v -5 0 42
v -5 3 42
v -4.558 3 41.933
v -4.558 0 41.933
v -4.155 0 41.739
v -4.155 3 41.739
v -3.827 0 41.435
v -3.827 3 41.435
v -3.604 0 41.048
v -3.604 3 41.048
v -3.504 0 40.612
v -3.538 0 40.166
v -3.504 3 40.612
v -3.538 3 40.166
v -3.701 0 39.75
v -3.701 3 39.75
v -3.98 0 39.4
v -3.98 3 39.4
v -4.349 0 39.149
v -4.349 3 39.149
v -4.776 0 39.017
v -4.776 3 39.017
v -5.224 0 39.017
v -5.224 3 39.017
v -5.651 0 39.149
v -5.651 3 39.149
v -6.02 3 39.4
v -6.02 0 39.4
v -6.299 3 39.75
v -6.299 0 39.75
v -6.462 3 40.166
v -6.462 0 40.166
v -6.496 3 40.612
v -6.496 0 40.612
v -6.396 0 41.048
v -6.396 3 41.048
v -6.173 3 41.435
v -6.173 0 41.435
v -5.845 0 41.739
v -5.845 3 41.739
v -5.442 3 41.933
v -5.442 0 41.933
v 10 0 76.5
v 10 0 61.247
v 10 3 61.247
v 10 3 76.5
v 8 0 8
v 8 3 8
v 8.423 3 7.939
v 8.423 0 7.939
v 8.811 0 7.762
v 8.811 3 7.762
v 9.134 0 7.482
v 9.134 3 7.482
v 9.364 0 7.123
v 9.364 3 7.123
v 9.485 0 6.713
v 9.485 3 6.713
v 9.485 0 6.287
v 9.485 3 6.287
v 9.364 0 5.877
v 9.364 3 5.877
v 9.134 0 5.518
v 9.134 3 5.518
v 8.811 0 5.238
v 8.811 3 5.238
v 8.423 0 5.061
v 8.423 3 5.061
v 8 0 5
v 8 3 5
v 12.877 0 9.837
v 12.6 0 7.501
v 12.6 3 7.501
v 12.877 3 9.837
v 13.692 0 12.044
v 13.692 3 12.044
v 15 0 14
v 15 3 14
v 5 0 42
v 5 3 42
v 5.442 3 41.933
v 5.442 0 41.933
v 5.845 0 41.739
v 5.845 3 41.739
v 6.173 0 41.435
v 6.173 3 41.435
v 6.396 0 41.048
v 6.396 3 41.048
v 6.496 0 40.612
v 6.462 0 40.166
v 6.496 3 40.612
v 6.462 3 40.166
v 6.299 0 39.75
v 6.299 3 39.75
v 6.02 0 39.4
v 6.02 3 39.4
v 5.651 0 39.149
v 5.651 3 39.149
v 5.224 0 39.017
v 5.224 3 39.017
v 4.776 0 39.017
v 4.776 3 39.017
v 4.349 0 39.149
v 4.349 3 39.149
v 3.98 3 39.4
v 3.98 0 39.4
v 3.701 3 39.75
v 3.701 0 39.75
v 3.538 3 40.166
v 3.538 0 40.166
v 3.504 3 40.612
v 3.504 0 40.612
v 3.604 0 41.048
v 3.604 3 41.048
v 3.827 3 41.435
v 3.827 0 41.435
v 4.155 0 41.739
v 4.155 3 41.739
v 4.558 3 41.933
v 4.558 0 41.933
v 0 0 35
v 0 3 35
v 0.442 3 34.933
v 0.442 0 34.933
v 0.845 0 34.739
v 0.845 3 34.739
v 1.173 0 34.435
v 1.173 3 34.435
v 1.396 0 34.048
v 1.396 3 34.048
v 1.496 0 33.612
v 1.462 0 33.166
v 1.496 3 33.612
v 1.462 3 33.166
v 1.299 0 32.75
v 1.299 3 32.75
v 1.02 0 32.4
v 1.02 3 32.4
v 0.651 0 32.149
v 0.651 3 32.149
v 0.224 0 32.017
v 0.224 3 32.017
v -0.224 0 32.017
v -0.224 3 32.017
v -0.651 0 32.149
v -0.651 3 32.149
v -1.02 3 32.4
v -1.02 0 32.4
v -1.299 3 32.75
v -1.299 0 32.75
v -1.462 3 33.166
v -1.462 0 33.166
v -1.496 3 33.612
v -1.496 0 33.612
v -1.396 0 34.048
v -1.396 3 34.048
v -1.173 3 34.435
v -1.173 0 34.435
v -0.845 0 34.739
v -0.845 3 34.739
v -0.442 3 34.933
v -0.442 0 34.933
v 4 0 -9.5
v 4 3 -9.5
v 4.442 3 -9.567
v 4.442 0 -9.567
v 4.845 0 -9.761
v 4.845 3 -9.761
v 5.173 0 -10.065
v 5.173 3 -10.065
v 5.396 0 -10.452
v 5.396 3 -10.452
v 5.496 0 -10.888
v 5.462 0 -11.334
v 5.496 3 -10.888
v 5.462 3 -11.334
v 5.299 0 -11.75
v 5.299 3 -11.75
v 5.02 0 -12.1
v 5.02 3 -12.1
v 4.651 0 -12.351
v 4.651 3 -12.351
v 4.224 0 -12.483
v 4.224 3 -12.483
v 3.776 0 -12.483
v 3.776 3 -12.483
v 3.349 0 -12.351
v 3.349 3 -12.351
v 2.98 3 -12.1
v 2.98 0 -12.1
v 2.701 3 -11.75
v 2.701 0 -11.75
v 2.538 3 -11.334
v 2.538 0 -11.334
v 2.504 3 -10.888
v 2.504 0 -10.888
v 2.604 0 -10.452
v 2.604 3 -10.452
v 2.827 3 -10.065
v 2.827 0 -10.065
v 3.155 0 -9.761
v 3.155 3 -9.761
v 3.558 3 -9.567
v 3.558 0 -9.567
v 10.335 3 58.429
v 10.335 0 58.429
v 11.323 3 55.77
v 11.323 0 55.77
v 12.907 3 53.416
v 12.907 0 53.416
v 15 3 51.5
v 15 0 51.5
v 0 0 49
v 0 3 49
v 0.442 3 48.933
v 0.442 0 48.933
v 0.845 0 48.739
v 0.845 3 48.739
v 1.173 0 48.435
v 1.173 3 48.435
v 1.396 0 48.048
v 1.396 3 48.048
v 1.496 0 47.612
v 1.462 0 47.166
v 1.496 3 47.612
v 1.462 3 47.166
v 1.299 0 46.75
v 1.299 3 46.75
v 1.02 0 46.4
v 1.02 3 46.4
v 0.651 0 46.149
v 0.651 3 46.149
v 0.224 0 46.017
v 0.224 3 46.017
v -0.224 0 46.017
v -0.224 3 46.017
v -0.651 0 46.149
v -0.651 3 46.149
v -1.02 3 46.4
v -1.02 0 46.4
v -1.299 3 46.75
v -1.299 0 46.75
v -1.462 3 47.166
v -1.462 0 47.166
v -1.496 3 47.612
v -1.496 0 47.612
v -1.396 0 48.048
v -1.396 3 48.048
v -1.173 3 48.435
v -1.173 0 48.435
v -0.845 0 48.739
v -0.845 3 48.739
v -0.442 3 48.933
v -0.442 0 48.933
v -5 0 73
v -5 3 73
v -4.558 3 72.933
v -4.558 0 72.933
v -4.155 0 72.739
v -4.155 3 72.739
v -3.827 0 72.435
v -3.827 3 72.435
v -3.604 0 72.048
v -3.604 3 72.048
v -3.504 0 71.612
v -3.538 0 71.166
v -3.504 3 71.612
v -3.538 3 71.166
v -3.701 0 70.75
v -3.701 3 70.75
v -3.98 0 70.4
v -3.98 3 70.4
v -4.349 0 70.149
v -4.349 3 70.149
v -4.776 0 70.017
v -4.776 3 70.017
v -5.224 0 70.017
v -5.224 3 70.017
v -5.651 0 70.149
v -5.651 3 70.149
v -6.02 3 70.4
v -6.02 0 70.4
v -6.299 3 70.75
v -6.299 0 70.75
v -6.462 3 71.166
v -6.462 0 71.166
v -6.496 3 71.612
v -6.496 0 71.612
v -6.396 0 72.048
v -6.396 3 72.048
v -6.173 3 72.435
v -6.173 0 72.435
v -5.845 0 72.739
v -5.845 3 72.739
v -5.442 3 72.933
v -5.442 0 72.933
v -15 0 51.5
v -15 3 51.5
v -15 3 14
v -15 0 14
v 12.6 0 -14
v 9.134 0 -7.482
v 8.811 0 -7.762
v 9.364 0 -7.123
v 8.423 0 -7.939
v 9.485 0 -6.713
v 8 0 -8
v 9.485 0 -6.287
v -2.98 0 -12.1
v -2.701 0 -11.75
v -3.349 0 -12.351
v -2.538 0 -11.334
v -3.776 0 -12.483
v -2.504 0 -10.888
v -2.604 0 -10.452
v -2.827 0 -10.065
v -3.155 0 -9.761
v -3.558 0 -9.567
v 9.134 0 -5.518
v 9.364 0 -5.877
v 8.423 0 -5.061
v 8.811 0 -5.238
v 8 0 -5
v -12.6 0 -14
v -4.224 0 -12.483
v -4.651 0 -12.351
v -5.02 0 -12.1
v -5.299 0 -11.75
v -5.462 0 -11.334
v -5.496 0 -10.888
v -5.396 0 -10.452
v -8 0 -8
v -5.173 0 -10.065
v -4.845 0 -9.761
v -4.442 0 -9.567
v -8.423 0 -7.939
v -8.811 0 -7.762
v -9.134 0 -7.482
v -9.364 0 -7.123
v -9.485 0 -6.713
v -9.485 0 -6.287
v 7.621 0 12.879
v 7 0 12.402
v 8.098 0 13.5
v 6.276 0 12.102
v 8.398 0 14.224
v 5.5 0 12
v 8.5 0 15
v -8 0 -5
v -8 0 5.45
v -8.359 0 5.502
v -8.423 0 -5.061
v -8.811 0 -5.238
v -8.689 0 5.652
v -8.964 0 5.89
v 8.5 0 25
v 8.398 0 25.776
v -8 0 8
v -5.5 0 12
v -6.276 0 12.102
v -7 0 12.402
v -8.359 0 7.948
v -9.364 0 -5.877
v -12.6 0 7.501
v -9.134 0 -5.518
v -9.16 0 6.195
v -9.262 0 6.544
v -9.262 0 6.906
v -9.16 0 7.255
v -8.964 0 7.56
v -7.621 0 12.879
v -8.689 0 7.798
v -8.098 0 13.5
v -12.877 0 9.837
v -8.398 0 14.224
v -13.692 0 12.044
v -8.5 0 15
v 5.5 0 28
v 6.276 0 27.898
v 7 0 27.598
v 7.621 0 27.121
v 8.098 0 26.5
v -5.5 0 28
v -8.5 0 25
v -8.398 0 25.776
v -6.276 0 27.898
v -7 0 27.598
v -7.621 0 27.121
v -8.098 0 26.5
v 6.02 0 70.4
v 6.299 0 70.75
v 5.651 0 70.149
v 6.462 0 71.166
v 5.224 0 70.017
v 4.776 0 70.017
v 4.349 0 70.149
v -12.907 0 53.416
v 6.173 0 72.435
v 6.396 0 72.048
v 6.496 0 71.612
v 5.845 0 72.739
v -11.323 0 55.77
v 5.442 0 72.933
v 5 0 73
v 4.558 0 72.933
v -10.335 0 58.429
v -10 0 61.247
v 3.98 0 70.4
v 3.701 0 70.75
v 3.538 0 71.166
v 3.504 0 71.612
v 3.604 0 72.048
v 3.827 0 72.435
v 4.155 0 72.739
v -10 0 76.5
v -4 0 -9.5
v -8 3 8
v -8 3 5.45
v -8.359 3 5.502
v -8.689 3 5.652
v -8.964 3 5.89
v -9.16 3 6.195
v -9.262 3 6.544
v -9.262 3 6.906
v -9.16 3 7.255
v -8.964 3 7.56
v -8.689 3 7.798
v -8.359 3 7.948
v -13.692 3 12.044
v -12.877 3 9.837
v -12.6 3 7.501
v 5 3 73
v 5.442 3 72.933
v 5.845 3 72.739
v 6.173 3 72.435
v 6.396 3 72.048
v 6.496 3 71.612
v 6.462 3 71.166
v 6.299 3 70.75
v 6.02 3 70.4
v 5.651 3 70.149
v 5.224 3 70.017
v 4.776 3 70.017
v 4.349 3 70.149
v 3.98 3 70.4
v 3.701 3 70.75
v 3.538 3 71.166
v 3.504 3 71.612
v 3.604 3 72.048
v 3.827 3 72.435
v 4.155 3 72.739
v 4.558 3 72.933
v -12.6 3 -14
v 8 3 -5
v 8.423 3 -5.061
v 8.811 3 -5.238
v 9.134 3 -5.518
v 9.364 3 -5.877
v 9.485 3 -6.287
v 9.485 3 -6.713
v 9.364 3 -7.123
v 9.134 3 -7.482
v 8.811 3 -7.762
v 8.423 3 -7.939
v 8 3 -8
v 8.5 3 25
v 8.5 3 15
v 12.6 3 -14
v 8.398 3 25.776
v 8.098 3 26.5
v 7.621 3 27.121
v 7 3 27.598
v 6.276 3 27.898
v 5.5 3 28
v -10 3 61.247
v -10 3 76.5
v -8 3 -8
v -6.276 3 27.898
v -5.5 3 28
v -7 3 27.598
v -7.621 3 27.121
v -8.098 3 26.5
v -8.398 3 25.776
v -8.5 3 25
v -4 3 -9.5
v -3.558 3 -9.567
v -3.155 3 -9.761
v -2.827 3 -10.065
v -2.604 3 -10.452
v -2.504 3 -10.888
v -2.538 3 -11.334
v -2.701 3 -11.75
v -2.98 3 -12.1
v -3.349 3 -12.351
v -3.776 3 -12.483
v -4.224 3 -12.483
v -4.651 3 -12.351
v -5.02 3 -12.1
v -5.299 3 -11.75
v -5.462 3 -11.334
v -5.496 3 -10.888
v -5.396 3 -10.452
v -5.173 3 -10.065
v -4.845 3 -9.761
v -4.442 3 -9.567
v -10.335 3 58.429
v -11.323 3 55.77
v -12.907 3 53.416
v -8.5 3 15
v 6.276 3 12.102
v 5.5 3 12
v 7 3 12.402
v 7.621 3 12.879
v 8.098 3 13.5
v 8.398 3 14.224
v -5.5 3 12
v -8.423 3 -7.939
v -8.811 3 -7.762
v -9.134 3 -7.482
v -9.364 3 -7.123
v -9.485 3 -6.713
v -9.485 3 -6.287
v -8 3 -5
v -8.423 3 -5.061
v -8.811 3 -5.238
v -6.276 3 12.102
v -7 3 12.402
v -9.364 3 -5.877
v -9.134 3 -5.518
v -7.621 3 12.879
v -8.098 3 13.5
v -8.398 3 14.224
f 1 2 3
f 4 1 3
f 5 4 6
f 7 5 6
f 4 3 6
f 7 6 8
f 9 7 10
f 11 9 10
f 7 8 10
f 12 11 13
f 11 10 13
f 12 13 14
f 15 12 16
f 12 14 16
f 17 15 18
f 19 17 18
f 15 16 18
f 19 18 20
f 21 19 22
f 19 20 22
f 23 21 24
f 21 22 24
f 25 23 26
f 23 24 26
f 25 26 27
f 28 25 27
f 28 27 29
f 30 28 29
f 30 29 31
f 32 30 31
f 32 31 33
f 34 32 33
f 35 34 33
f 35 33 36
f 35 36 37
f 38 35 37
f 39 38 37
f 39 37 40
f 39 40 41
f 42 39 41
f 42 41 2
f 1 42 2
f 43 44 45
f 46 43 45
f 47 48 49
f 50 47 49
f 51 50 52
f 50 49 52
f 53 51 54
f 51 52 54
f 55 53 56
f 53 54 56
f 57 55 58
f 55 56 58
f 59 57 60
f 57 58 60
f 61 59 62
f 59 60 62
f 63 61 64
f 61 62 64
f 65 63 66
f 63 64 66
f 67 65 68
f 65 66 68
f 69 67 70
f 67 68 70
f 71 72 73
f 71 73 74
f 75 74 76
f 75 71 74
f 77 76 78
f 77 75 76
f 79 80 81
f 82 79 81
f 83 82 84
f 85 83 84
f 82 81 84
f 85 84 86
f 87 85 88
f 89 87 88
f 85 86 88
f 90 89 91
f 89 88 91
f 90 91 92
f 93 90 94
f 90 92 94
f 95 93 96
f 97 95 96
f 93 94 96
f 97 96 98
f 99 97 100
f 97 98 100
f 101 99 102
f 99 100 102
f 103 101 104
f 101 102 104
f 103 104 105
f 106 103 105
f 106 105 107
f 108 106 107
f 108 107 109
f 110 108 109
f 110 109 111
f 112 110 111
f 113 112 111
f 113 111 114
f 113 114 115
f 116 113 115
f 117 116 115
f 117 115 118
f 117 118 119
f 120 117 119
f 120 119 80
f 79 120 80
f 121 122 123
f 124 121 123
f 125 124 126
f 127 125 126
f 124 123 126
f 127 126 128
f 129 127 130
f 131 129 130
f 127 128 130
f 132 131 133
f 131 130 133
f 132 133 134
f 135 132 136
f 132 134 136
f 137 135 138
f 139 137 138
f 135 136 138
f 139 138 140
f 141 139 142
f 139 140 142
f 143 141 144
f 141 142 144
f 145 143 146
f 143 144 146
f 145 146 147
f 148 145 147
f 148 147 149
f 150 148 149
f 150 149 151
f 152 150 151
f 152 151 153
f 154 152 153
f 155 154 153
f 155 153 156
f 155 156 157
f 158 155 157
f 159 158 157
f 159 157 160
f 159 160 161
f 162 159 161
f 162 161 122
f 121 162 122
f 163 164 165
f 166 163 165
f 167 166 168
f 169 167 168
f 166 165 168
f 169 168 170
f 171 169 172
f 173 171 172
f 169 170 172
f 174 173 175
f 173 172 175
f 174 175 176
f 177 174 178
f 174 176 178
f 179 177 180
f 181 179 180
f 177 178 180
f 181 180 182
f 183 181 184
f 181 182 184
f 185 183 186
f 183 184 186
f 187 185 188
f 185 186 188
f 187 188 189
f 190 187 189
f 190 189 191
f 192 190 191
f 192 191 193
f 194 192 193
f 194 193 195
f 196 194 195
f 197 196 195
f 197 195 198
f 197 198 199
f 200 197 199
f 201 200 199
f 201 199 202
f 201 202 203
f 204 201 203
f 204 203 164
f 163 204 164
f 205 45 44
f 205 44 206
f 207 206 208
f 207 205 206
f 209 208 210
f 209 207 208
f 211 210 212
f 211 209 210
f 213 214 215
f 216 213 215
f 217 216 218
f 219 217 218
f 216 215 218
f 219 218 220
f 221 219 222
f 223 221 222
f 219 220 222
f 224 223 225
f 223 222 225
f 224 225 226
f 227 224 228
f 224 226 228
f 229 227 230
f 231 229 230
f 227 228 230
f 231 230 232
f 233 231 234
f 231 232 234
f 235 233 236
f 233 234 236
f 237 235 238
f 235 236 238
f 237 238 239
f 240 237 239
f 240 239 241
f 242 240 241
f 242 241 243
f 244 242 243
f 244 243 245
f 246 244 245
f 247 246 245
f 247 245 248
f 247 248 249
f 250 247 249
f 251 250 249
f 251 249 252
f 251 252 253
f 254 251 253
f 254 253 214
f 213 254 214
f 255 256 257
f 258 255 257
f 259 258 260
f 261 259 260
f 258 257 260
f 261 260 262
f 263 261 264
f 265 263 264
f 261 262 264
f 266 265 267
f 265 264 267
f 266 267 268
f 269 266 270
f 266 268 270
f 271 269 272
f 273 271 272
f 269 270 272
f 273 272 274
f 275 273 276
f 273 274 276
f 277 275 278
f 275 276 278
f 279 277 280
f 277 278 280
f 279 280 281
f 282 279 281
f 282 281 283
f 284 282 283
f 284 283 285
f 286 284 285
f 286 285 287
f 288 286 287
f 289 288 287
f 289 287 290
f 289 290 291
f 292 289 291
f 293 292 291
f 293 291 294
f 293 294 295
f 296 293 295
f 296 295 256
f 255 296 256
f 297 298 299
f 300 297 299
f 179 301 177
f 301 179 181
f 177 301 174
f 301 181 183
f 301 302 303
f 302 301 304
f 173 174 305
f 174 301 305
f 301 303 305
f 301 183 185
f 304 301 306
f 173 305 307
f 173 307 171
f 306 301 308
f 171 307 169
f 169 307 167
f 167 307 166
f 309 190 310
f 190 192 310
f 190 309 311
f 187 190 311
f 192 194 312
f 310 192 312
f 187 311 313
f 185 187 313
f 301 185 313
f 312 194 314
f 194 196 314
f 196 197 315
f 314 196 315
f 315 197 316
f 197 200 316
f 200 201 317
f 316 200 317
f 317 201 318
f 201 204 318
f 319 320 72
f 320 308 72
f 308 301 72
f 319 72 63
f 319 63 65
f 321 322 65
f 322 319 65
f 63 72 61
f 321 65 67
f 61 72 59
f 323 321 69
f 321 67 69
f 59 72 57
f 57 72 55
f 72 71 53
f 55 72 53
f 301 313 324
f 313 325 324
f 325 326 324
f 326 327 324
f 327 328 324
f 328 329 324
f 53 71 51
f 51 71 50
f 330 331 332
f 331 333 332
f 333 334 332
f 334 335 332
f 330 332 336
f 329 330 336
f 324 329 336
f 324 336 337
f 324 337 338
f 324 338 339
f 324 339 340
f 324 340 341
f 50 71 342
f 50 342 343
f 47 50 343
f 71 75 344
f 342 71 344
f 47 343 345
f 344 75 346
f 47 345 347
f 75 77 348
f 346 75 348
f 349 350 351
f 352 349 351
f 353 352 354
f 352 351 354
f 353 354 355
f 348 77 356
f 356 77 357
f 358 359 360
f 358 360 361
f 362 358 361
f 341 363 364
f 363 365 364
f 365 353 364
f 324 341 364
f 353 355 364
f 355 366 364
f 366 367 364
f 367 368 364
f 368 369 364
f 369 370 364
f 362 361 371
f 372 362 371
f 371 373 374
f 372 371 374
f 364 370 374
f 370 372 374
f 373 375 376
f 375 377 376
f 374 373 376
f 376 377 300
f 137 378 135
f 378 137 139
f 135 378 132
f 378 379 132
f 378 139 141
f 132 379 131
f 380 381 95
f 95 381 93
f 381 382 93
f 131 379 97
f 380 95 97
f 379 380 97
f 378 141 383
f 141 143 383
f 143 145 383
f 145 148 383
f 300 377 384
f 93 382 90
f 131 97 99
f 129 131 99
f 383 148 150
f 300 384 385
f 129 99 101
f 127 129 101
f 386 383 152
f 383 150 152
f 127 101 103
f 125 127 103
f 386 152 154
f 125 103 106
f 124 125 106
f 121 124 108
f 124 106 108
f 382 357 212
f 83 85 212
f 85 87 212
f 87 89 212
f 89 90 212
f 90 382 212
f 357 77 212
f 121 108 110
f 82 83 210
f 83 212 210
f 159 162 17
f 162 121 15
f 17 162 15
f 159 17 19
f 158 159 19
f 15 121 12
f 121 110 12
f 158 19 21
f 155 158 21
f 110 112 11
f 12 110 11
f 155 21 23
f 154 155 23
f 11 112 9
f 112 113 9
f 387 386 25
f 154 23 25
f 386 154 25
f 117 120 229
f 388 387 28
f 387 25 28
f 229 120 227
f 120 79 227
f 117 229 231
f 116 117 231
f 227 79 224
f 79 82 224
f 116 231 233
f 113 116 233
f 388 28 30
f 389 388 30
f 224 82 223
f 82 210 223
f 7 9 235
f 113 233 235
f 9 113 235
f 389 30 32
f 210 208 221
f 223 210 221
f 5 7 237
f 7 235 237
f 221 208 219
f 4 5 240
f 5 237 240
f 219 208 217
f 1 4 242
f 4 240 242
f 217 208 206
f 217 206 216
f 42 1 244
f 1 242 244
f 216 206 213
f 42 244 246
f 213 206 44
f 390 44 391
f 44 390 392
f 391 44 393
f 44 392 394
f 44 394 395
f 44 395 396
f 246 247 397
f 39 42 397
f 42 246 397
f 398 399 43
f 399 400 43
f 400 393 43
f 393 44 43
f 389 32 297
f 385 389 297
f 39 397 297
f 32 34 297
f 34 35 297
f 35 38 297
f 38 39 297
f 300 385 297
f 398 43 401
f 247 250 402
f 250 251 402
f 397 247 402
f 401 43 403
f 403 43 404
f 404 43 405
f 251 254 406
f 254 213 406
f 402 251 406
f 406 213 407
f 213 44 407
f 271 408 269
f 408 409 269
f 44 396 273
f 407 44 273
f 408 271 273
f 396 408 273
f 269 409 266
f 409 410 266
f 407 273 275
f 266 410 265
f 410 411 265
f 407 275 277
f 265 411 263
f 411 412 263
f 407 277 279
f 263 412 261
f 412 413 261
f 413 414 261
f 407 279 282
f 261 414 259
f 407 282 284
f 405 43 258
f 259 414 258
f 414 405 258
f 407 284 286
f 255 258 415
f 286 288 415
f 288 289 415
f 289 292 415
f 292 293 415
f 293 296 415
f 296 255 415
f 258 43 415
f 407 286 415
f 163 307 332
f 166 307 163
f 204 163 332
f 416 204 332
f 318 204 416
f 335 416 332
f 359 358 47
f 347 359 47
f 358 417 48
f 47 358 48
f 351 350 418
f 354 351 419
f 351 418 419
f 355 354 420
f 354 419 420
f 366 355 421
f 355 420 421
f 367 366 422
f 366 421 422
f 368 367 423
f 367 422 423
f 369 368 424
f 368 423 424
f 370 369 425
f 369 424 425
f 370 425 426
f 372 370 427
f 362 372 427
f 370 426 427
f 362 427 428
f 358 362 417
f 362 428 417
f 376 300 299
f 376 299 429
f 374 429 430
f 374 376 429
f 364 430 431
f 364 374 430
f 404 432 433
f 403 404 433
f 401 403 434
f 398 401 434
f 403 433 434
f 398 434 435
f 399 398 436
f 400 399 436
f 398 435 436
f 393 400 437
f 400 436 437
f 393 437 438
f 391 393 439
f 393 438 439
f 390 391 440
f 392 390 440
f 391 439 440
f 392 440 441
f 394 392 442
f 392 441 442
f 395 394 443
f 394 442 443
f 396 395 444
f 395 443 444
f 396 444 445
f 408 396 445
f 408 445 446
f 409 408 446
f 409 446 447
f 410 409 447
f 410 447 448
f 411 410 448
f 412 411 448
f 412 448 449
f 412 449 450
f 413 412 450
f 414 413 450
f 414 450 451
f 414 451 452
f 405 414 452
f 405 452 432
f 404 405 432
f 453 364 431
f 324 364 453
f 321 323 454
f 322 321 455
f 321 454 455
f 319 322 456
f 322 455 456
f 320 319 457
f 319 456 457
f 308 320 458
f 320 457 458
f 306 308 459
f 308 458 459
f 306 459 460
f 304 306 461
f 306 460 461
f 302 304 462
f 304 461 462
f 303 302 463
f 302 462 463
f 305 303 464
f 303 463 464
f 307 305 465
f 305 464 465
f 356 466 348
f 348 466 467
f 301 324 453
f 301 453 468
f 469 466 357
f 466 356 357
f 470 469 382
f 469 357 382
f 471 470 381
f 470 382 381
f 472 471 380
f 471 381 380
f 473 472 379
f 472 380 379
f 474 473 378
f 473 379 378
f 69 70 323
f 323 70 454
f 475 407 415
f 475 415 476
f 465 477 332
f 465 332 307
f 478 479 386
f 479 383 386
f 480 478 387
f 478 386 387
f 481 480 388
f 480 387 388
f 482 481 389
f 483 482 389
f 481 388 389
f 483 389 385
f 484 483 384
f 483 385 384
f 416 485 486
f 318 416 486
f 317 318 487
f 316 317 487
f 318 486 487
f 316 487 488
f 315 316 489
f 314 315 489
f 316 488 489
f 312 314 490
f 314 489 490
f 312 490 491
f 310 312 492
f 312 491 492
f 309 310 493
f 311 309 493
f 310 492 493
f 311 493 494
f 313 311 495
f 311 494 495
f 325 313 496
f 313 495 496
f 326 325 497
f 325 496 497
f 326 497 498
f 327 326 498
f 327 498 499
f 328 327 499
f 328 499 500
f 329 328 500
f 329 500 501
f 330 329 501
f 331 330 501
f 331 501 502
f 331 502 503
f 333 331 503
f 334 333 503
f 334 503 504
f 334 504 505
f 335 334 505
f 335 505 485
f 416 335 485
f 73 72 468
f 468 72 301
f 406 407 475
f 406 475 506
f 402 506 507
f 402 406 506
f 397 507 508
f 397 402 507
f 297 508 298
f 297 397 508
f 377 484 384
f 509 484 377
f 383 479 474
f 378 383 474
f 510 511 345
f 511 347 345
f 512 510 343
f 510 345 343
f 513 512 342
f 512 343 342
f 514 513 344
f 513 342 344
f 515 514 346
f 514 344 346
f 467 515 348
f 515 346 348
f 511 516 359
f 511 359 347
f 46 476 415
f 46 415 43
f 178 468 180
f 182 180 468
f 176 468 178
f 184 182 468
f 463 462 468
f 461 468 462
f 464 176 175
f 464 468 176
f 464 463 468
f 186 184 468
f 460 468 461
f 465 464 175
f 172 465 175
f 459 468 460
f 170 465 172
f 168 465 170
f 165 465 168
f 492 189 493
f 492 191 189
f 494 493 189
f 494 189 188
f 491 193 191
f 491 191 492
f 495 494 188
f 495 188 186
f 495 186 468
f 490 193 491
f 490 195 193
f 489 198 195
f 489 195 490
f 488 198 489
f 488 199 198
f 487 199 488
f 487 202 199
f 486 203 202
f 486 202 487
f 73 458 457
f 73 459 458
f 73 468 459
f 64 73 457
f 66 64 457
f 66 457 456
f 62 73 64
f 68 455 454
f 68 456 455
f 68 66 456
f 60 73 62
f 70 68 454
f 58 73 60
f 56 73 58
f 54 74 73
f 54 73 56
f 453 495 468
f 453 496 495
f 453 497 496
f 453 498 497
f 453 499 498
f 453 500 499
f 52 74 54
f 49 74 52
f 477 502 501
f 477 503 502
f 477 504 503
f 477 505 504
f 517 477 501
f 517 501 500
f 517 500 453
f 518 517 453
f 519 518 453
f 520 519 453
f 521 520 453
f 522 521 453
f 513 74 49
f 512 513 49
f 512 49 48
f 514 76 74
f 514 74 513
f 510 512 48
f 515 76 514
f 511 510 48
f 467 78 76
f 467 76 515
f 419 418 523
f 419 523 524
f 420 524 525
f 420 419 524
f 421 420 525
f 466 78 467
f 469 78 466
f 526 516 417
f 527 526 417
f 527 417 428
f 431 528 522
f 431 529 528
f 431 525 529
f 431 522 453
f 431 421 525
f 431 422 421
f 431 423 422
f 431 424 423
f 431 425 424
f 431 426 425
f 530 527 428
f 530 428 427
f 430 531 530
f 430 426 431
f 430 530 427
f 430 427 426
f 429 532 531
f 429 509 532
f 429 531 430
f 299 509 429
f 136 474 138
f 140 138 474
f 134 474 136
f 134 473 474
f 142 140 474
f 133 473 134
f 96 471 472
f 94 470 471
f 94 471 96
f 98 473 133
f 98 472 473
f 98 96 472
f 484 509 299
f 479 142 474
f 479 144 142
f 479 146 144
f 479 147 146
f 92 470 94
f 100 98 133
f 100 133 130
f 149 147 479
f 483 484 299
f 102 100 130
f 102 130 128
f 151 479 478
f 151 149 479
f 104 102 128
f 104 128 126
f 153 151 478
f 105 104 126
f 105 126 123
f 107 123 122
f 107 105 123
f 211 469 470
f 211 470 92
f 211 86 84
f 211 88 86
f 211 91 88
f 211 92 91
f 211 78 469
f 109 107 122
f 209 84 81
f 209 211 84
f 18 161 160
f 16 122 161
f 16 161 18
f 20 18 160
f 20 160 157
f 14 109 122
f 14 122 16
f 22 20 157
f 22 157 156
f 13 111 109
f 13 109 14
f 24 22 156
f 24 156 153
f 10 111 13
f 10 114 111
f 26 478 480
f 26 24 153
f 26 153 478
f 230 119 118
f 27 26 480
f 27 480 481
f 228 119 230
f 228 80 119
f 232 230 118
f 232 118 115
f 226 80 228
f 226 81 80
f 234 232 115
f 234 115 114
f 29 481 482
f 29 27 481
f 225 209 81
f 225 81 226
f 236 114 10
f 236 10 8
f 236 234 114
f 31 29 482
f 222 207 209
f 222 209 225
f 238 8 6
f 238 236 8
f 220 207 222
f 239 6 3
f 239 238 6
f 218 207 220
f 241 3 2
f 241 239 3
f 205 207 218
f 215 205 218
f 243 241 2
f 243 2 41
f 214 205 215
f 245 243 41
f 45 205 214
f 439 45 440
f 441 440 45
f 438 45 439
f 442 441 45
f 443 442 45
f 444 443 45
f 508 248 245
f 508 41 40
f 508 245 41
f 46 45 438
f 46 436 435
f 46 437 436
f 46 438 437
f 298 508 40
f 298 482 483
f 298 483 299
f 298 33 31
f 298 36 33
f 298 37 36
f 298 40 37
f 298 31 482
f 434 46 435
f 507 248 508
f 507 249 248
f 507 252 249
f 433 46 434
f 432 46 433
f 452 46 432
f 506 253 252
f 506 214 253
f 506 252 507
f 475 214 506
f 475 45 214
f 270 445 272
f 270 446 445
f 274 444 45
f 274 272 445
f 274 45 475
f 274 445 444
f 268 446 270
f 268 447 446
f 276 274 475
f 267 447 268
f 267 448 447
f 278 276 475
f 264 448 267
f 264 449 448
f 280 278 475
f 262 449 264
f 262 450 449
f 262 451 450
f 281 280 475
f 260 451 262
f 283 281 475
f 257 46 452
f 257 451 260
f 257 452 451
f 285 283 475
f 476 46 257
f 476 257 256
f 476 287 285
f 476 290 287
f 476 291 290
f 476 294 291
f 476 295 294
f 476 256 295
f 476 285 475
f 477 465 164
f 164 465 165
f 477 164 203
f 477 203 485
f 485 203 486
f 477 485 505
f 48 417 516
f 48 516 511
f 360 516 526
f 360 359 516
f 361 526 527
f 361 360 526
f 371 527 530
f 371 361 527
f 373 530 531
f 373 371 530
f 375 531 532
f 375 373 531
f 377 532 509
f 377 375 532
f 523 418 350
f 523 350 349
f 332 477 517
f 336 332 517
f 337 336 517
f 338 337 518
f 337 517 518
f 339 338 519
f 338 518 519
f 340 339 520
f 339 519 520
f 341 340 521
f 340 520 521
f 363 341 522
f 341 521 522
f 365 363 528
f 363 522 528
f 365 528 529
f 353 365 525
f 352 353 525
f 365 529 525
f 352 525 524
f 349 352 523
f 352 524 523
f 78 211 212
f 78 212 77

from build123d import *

# Parameters (mm, degrees)
SKETCH_1_W          = 25.2
SKETCH_1_H          = 28
EXTRUDE_1_DEPTH     = 3
SKETCH_4_R          = 1.5
SKETCH_4_W          = 16
SKETCH_4_H          = 16
CUT_EXTRUDE_3_DEPTH = 20.072493282
SKETCH_6_W          = 30
SKETCH_6_H          = 37.5
EXTRUDE_2_DEPTH     = 3
SKETCH_7_R          = 1.5
CUT_EXTRUDE_5_DEPTH = 54.723830839
FILLET_1_R          = 10
SKETCH_8_W          = 17
SKETCH_8_H          = 16
CUT_EXTRUDE_6_DEPTH = 54.723830839
FILLET_2_R          = 3
SKETCH_5_R          = 1.5
SKETCH_5_R_2        = 1.275
CUT_EXTRUDE_7_DEPTH = 10
SKETCH_9_W          = 20
SKETCH_9_H          = 3
EXTRUDE_3_DEPTH     = 25
FILLET_3_R          = 12
SKETCH_12_R         = 1.5
CUT_EXTRUDE_9_DEPTH = 79.014421744


with BuildPart() as part:
    # 草图1 → 凸台-拉伸1 (new body)
    with BuildSketch(Plane(origin=(0, 0, 0), x_dir=(1, 0, 0), z_dir=(0, 1, 0))):
        Rectangle(SKETCH_1_W, SKETCH_1_H)
    extrude(amount=EXTRUDE_1_DEPTH)

    # 草图4 → 切除-拉伸3 (cut, through all)
    with BuildSketch(Plane(origin=(0, 3, 0), x_dir=(1, 0, 0), z_dir=(0, 1, 0))):
        with Locations(Location((4, 11, 0), (0, 0, 270))):
            Circle(SKETCH_4_R)
        with Locations(Location((-4, 11, 0), (0, 0, 270))):
            Circle(SKETCH_4_R)
        Rectangle(SKETCH_4_W, SKETCH_4_H)
    extrude(amount=-CUT_EXTRUDE_3_DEPTH, mode=Mode.SUBTRACT)

    # 草图6 → 凸台-拉伸2 (add)
    with BuildSketch(Plane(origin=(0, 3, 0), x_dir=(1, 0, 0), z_dir=(0, 1, 0))):
        with Locations((0, -32.75)):
            Rectangle(SKETCH_6_W, SKETCH_6_H)
    extrude(amount=-EXTRUDE_2_DEPTH)

    # 草图7 → 切除-拉伸5 (cut, through all)
    with BuildSketch(Plane(origin=(0, 3, 0), x_dir=(1, 0, 0), z_dir=(0, 1, 0))):
        with Locations(Location((0, -33.5, 0), (0, 0, 270))):
            Circle(SKETCH_7_R)
        with Locations(Location((-5, -40.5, 0), (0, 0, 270))):
            Circle(SKETCH_7_R)
        with Locations(Location((5, -40.5, 0), (0, 0, 270))):
            Circle(SKETCH_7_R)
        with Locations(Location((0, -47.5, 0), (0, 0, 270))):
            Circle(SKETCH_7_R)
    extrude(amount=-CUT_EXTRUDE_5_DEPTH, mode=Mode.SUBTRACT)

    # 圆角1
    # the kernel refuses this fillet: 10 mm, written as the material it adds along each edge
    with BuildSketch(Plane(origin=(12.6, 0, 14), x_dir=(0, 0, -1), z_dir=(0, 1, 0))) as fillet_1_piece_1:
        with BuildLine():
            CenterArc((6.499230724, -10), FILLET_1_R, 90, 40.535802111)
            Line((0, -2.4), (-0.129984614, -2.248))
            ThreePointArc((-0.129984614, -2.248), (-0.2, -1.2), (-0.2, 0))
            Line((-0.2, 0), (0, 0.2))
            Line((0, 0.2), (6.499230724, 0.2))
            Line((6.499230724, 0.2), (6.499230724, 0))
        make_face()
    extrude(amount=3)
    with BuildSketch(Plane(origin=(-12.6, 0, 14), x_dir=(-1, 0, 0), z_dir=(0, 1, 0))) as fillet_1_piece_2:
        with BuildLine():
            CenterArc((10, -6.499230724), FILLET_1_R, 139.464197889, 40.535802111)
            Line((0, -6.499230724), (-0.2, -6.499230724))
            Line((-0.2, -6.499230724), (-0.2, 0))
            Line((-0.2, 0), (0, 0.2))
            ThreePointArc((0, 0.2), (1.2, 0.2), (2.248, 0.129984614))
            Line((2.248, 0.129984614), (2.4, 0))
        make_face()
    extrude(amount=3)

    # 草图8 → 切除-拉伸6 (cut, through all)
    with BuildSketch(Plane(origin=(0, 3, 0), x_dir=(1, 0, 0), z_dir=(0, 1, 0))):
        with Locations((0, -20)):
            Rectangle(SKETCH_8_W, SKETCH_8_H)
    extrude(amount=-CUT_EXTRUDE_6_DEPTH, mode=Mode.SUBTRACT)

    # 圆角2
    fillet_2_edges = [part.edges().sort_by_distance(p)[0] for p in [
        (8.5, 1.5, 12),
        (8.5, 1.5, 28),
        (-8.5, 1.5, 28),
        (-8.5, 1.5, 12),
    ]]
    fillet(fillet_2_edges, radius=FILLET_2_R)

    # 草图5 → 切除-拉伸7 (cut)
    with BuildSketch(Plane(origin=(0, 3, 0), x_dir=(1, 0, 0), z_dir=(0, 1, 0))):
        with Locations((8, 6.5)):
            Circle(SKETCH_5_R)
        with Locations((-8, 6.5)):
            Circle(SKETCH_5_R)
        with Locations((8, -6.5)):
            Circle(SKETCH_5_R)
        with Locations((-8, -6.725)):
            Circle(SKETCH_5_R_2)
    extrude(amount=-CUT_EXTRUDE_7_DEPTH, mode=Mode.SUBTRACT)

    # 草图9 → 凸台-拉伸3 (add)
    with BuildSketch(Plane.XY.offset(51.5)):
        with Locations((0, 1.5)):
            Rectangle(SKETCH_9_W, SKETCH_9_H)
    extrude(amount=EXTRUDE_3_DEPTH)

    # 圆角3
    # the kernel refuses this fillet: 12 mm, written as the material it adds along each edge
    with BuildSketch(Plane(origin=(10, 3, 51.5), x_dir=(1, 0, 0), z_dir=(0, -1, 0)), Plane(origin=(-10, 0, 51.5), x_dir=(-1, 0, 0), z_dir=(0, 1, 0))) as fillet_3_piece_1:
        with BuildLine():
            CenterArc((12, 9.746794345), FILLET_3_R, 180, 54.314665287)
            Line((0, 9.746794345), (-0.24, 9.746794345))
            Line((-0.24, 9.746794345), (-0.24, 0))
            Line((-0.24, 0), (0, -0.24))
            ThreePointArc((0, -0.24), (2.5, -0.24), (4.86, -0.194935887))
            Line((4.86, -0.194935887), (5, 0))
        make_face()
    extrude(amount=3)

    # 草图12 → 切除-拉伸9 (cut, through all)
    with BuildSketch(Plane(origin=(0, 3, 0), x_dir=(1, 0, 0), z_dir=(0, 1, 0))):
        with Locations(Location((5, -71.5, 0), (0, 0, 270))):
            Circle(SKETCH_12_R)
        with Locations(Location((-5, -71.5, 0), (0, 0, 270))):
            Circle(SKETCH_12_R)
    extrude(amount=-CUT_EXTRUDE_9_DEPTH, mode=Mode.SUBTRACT)


solid = part.part
